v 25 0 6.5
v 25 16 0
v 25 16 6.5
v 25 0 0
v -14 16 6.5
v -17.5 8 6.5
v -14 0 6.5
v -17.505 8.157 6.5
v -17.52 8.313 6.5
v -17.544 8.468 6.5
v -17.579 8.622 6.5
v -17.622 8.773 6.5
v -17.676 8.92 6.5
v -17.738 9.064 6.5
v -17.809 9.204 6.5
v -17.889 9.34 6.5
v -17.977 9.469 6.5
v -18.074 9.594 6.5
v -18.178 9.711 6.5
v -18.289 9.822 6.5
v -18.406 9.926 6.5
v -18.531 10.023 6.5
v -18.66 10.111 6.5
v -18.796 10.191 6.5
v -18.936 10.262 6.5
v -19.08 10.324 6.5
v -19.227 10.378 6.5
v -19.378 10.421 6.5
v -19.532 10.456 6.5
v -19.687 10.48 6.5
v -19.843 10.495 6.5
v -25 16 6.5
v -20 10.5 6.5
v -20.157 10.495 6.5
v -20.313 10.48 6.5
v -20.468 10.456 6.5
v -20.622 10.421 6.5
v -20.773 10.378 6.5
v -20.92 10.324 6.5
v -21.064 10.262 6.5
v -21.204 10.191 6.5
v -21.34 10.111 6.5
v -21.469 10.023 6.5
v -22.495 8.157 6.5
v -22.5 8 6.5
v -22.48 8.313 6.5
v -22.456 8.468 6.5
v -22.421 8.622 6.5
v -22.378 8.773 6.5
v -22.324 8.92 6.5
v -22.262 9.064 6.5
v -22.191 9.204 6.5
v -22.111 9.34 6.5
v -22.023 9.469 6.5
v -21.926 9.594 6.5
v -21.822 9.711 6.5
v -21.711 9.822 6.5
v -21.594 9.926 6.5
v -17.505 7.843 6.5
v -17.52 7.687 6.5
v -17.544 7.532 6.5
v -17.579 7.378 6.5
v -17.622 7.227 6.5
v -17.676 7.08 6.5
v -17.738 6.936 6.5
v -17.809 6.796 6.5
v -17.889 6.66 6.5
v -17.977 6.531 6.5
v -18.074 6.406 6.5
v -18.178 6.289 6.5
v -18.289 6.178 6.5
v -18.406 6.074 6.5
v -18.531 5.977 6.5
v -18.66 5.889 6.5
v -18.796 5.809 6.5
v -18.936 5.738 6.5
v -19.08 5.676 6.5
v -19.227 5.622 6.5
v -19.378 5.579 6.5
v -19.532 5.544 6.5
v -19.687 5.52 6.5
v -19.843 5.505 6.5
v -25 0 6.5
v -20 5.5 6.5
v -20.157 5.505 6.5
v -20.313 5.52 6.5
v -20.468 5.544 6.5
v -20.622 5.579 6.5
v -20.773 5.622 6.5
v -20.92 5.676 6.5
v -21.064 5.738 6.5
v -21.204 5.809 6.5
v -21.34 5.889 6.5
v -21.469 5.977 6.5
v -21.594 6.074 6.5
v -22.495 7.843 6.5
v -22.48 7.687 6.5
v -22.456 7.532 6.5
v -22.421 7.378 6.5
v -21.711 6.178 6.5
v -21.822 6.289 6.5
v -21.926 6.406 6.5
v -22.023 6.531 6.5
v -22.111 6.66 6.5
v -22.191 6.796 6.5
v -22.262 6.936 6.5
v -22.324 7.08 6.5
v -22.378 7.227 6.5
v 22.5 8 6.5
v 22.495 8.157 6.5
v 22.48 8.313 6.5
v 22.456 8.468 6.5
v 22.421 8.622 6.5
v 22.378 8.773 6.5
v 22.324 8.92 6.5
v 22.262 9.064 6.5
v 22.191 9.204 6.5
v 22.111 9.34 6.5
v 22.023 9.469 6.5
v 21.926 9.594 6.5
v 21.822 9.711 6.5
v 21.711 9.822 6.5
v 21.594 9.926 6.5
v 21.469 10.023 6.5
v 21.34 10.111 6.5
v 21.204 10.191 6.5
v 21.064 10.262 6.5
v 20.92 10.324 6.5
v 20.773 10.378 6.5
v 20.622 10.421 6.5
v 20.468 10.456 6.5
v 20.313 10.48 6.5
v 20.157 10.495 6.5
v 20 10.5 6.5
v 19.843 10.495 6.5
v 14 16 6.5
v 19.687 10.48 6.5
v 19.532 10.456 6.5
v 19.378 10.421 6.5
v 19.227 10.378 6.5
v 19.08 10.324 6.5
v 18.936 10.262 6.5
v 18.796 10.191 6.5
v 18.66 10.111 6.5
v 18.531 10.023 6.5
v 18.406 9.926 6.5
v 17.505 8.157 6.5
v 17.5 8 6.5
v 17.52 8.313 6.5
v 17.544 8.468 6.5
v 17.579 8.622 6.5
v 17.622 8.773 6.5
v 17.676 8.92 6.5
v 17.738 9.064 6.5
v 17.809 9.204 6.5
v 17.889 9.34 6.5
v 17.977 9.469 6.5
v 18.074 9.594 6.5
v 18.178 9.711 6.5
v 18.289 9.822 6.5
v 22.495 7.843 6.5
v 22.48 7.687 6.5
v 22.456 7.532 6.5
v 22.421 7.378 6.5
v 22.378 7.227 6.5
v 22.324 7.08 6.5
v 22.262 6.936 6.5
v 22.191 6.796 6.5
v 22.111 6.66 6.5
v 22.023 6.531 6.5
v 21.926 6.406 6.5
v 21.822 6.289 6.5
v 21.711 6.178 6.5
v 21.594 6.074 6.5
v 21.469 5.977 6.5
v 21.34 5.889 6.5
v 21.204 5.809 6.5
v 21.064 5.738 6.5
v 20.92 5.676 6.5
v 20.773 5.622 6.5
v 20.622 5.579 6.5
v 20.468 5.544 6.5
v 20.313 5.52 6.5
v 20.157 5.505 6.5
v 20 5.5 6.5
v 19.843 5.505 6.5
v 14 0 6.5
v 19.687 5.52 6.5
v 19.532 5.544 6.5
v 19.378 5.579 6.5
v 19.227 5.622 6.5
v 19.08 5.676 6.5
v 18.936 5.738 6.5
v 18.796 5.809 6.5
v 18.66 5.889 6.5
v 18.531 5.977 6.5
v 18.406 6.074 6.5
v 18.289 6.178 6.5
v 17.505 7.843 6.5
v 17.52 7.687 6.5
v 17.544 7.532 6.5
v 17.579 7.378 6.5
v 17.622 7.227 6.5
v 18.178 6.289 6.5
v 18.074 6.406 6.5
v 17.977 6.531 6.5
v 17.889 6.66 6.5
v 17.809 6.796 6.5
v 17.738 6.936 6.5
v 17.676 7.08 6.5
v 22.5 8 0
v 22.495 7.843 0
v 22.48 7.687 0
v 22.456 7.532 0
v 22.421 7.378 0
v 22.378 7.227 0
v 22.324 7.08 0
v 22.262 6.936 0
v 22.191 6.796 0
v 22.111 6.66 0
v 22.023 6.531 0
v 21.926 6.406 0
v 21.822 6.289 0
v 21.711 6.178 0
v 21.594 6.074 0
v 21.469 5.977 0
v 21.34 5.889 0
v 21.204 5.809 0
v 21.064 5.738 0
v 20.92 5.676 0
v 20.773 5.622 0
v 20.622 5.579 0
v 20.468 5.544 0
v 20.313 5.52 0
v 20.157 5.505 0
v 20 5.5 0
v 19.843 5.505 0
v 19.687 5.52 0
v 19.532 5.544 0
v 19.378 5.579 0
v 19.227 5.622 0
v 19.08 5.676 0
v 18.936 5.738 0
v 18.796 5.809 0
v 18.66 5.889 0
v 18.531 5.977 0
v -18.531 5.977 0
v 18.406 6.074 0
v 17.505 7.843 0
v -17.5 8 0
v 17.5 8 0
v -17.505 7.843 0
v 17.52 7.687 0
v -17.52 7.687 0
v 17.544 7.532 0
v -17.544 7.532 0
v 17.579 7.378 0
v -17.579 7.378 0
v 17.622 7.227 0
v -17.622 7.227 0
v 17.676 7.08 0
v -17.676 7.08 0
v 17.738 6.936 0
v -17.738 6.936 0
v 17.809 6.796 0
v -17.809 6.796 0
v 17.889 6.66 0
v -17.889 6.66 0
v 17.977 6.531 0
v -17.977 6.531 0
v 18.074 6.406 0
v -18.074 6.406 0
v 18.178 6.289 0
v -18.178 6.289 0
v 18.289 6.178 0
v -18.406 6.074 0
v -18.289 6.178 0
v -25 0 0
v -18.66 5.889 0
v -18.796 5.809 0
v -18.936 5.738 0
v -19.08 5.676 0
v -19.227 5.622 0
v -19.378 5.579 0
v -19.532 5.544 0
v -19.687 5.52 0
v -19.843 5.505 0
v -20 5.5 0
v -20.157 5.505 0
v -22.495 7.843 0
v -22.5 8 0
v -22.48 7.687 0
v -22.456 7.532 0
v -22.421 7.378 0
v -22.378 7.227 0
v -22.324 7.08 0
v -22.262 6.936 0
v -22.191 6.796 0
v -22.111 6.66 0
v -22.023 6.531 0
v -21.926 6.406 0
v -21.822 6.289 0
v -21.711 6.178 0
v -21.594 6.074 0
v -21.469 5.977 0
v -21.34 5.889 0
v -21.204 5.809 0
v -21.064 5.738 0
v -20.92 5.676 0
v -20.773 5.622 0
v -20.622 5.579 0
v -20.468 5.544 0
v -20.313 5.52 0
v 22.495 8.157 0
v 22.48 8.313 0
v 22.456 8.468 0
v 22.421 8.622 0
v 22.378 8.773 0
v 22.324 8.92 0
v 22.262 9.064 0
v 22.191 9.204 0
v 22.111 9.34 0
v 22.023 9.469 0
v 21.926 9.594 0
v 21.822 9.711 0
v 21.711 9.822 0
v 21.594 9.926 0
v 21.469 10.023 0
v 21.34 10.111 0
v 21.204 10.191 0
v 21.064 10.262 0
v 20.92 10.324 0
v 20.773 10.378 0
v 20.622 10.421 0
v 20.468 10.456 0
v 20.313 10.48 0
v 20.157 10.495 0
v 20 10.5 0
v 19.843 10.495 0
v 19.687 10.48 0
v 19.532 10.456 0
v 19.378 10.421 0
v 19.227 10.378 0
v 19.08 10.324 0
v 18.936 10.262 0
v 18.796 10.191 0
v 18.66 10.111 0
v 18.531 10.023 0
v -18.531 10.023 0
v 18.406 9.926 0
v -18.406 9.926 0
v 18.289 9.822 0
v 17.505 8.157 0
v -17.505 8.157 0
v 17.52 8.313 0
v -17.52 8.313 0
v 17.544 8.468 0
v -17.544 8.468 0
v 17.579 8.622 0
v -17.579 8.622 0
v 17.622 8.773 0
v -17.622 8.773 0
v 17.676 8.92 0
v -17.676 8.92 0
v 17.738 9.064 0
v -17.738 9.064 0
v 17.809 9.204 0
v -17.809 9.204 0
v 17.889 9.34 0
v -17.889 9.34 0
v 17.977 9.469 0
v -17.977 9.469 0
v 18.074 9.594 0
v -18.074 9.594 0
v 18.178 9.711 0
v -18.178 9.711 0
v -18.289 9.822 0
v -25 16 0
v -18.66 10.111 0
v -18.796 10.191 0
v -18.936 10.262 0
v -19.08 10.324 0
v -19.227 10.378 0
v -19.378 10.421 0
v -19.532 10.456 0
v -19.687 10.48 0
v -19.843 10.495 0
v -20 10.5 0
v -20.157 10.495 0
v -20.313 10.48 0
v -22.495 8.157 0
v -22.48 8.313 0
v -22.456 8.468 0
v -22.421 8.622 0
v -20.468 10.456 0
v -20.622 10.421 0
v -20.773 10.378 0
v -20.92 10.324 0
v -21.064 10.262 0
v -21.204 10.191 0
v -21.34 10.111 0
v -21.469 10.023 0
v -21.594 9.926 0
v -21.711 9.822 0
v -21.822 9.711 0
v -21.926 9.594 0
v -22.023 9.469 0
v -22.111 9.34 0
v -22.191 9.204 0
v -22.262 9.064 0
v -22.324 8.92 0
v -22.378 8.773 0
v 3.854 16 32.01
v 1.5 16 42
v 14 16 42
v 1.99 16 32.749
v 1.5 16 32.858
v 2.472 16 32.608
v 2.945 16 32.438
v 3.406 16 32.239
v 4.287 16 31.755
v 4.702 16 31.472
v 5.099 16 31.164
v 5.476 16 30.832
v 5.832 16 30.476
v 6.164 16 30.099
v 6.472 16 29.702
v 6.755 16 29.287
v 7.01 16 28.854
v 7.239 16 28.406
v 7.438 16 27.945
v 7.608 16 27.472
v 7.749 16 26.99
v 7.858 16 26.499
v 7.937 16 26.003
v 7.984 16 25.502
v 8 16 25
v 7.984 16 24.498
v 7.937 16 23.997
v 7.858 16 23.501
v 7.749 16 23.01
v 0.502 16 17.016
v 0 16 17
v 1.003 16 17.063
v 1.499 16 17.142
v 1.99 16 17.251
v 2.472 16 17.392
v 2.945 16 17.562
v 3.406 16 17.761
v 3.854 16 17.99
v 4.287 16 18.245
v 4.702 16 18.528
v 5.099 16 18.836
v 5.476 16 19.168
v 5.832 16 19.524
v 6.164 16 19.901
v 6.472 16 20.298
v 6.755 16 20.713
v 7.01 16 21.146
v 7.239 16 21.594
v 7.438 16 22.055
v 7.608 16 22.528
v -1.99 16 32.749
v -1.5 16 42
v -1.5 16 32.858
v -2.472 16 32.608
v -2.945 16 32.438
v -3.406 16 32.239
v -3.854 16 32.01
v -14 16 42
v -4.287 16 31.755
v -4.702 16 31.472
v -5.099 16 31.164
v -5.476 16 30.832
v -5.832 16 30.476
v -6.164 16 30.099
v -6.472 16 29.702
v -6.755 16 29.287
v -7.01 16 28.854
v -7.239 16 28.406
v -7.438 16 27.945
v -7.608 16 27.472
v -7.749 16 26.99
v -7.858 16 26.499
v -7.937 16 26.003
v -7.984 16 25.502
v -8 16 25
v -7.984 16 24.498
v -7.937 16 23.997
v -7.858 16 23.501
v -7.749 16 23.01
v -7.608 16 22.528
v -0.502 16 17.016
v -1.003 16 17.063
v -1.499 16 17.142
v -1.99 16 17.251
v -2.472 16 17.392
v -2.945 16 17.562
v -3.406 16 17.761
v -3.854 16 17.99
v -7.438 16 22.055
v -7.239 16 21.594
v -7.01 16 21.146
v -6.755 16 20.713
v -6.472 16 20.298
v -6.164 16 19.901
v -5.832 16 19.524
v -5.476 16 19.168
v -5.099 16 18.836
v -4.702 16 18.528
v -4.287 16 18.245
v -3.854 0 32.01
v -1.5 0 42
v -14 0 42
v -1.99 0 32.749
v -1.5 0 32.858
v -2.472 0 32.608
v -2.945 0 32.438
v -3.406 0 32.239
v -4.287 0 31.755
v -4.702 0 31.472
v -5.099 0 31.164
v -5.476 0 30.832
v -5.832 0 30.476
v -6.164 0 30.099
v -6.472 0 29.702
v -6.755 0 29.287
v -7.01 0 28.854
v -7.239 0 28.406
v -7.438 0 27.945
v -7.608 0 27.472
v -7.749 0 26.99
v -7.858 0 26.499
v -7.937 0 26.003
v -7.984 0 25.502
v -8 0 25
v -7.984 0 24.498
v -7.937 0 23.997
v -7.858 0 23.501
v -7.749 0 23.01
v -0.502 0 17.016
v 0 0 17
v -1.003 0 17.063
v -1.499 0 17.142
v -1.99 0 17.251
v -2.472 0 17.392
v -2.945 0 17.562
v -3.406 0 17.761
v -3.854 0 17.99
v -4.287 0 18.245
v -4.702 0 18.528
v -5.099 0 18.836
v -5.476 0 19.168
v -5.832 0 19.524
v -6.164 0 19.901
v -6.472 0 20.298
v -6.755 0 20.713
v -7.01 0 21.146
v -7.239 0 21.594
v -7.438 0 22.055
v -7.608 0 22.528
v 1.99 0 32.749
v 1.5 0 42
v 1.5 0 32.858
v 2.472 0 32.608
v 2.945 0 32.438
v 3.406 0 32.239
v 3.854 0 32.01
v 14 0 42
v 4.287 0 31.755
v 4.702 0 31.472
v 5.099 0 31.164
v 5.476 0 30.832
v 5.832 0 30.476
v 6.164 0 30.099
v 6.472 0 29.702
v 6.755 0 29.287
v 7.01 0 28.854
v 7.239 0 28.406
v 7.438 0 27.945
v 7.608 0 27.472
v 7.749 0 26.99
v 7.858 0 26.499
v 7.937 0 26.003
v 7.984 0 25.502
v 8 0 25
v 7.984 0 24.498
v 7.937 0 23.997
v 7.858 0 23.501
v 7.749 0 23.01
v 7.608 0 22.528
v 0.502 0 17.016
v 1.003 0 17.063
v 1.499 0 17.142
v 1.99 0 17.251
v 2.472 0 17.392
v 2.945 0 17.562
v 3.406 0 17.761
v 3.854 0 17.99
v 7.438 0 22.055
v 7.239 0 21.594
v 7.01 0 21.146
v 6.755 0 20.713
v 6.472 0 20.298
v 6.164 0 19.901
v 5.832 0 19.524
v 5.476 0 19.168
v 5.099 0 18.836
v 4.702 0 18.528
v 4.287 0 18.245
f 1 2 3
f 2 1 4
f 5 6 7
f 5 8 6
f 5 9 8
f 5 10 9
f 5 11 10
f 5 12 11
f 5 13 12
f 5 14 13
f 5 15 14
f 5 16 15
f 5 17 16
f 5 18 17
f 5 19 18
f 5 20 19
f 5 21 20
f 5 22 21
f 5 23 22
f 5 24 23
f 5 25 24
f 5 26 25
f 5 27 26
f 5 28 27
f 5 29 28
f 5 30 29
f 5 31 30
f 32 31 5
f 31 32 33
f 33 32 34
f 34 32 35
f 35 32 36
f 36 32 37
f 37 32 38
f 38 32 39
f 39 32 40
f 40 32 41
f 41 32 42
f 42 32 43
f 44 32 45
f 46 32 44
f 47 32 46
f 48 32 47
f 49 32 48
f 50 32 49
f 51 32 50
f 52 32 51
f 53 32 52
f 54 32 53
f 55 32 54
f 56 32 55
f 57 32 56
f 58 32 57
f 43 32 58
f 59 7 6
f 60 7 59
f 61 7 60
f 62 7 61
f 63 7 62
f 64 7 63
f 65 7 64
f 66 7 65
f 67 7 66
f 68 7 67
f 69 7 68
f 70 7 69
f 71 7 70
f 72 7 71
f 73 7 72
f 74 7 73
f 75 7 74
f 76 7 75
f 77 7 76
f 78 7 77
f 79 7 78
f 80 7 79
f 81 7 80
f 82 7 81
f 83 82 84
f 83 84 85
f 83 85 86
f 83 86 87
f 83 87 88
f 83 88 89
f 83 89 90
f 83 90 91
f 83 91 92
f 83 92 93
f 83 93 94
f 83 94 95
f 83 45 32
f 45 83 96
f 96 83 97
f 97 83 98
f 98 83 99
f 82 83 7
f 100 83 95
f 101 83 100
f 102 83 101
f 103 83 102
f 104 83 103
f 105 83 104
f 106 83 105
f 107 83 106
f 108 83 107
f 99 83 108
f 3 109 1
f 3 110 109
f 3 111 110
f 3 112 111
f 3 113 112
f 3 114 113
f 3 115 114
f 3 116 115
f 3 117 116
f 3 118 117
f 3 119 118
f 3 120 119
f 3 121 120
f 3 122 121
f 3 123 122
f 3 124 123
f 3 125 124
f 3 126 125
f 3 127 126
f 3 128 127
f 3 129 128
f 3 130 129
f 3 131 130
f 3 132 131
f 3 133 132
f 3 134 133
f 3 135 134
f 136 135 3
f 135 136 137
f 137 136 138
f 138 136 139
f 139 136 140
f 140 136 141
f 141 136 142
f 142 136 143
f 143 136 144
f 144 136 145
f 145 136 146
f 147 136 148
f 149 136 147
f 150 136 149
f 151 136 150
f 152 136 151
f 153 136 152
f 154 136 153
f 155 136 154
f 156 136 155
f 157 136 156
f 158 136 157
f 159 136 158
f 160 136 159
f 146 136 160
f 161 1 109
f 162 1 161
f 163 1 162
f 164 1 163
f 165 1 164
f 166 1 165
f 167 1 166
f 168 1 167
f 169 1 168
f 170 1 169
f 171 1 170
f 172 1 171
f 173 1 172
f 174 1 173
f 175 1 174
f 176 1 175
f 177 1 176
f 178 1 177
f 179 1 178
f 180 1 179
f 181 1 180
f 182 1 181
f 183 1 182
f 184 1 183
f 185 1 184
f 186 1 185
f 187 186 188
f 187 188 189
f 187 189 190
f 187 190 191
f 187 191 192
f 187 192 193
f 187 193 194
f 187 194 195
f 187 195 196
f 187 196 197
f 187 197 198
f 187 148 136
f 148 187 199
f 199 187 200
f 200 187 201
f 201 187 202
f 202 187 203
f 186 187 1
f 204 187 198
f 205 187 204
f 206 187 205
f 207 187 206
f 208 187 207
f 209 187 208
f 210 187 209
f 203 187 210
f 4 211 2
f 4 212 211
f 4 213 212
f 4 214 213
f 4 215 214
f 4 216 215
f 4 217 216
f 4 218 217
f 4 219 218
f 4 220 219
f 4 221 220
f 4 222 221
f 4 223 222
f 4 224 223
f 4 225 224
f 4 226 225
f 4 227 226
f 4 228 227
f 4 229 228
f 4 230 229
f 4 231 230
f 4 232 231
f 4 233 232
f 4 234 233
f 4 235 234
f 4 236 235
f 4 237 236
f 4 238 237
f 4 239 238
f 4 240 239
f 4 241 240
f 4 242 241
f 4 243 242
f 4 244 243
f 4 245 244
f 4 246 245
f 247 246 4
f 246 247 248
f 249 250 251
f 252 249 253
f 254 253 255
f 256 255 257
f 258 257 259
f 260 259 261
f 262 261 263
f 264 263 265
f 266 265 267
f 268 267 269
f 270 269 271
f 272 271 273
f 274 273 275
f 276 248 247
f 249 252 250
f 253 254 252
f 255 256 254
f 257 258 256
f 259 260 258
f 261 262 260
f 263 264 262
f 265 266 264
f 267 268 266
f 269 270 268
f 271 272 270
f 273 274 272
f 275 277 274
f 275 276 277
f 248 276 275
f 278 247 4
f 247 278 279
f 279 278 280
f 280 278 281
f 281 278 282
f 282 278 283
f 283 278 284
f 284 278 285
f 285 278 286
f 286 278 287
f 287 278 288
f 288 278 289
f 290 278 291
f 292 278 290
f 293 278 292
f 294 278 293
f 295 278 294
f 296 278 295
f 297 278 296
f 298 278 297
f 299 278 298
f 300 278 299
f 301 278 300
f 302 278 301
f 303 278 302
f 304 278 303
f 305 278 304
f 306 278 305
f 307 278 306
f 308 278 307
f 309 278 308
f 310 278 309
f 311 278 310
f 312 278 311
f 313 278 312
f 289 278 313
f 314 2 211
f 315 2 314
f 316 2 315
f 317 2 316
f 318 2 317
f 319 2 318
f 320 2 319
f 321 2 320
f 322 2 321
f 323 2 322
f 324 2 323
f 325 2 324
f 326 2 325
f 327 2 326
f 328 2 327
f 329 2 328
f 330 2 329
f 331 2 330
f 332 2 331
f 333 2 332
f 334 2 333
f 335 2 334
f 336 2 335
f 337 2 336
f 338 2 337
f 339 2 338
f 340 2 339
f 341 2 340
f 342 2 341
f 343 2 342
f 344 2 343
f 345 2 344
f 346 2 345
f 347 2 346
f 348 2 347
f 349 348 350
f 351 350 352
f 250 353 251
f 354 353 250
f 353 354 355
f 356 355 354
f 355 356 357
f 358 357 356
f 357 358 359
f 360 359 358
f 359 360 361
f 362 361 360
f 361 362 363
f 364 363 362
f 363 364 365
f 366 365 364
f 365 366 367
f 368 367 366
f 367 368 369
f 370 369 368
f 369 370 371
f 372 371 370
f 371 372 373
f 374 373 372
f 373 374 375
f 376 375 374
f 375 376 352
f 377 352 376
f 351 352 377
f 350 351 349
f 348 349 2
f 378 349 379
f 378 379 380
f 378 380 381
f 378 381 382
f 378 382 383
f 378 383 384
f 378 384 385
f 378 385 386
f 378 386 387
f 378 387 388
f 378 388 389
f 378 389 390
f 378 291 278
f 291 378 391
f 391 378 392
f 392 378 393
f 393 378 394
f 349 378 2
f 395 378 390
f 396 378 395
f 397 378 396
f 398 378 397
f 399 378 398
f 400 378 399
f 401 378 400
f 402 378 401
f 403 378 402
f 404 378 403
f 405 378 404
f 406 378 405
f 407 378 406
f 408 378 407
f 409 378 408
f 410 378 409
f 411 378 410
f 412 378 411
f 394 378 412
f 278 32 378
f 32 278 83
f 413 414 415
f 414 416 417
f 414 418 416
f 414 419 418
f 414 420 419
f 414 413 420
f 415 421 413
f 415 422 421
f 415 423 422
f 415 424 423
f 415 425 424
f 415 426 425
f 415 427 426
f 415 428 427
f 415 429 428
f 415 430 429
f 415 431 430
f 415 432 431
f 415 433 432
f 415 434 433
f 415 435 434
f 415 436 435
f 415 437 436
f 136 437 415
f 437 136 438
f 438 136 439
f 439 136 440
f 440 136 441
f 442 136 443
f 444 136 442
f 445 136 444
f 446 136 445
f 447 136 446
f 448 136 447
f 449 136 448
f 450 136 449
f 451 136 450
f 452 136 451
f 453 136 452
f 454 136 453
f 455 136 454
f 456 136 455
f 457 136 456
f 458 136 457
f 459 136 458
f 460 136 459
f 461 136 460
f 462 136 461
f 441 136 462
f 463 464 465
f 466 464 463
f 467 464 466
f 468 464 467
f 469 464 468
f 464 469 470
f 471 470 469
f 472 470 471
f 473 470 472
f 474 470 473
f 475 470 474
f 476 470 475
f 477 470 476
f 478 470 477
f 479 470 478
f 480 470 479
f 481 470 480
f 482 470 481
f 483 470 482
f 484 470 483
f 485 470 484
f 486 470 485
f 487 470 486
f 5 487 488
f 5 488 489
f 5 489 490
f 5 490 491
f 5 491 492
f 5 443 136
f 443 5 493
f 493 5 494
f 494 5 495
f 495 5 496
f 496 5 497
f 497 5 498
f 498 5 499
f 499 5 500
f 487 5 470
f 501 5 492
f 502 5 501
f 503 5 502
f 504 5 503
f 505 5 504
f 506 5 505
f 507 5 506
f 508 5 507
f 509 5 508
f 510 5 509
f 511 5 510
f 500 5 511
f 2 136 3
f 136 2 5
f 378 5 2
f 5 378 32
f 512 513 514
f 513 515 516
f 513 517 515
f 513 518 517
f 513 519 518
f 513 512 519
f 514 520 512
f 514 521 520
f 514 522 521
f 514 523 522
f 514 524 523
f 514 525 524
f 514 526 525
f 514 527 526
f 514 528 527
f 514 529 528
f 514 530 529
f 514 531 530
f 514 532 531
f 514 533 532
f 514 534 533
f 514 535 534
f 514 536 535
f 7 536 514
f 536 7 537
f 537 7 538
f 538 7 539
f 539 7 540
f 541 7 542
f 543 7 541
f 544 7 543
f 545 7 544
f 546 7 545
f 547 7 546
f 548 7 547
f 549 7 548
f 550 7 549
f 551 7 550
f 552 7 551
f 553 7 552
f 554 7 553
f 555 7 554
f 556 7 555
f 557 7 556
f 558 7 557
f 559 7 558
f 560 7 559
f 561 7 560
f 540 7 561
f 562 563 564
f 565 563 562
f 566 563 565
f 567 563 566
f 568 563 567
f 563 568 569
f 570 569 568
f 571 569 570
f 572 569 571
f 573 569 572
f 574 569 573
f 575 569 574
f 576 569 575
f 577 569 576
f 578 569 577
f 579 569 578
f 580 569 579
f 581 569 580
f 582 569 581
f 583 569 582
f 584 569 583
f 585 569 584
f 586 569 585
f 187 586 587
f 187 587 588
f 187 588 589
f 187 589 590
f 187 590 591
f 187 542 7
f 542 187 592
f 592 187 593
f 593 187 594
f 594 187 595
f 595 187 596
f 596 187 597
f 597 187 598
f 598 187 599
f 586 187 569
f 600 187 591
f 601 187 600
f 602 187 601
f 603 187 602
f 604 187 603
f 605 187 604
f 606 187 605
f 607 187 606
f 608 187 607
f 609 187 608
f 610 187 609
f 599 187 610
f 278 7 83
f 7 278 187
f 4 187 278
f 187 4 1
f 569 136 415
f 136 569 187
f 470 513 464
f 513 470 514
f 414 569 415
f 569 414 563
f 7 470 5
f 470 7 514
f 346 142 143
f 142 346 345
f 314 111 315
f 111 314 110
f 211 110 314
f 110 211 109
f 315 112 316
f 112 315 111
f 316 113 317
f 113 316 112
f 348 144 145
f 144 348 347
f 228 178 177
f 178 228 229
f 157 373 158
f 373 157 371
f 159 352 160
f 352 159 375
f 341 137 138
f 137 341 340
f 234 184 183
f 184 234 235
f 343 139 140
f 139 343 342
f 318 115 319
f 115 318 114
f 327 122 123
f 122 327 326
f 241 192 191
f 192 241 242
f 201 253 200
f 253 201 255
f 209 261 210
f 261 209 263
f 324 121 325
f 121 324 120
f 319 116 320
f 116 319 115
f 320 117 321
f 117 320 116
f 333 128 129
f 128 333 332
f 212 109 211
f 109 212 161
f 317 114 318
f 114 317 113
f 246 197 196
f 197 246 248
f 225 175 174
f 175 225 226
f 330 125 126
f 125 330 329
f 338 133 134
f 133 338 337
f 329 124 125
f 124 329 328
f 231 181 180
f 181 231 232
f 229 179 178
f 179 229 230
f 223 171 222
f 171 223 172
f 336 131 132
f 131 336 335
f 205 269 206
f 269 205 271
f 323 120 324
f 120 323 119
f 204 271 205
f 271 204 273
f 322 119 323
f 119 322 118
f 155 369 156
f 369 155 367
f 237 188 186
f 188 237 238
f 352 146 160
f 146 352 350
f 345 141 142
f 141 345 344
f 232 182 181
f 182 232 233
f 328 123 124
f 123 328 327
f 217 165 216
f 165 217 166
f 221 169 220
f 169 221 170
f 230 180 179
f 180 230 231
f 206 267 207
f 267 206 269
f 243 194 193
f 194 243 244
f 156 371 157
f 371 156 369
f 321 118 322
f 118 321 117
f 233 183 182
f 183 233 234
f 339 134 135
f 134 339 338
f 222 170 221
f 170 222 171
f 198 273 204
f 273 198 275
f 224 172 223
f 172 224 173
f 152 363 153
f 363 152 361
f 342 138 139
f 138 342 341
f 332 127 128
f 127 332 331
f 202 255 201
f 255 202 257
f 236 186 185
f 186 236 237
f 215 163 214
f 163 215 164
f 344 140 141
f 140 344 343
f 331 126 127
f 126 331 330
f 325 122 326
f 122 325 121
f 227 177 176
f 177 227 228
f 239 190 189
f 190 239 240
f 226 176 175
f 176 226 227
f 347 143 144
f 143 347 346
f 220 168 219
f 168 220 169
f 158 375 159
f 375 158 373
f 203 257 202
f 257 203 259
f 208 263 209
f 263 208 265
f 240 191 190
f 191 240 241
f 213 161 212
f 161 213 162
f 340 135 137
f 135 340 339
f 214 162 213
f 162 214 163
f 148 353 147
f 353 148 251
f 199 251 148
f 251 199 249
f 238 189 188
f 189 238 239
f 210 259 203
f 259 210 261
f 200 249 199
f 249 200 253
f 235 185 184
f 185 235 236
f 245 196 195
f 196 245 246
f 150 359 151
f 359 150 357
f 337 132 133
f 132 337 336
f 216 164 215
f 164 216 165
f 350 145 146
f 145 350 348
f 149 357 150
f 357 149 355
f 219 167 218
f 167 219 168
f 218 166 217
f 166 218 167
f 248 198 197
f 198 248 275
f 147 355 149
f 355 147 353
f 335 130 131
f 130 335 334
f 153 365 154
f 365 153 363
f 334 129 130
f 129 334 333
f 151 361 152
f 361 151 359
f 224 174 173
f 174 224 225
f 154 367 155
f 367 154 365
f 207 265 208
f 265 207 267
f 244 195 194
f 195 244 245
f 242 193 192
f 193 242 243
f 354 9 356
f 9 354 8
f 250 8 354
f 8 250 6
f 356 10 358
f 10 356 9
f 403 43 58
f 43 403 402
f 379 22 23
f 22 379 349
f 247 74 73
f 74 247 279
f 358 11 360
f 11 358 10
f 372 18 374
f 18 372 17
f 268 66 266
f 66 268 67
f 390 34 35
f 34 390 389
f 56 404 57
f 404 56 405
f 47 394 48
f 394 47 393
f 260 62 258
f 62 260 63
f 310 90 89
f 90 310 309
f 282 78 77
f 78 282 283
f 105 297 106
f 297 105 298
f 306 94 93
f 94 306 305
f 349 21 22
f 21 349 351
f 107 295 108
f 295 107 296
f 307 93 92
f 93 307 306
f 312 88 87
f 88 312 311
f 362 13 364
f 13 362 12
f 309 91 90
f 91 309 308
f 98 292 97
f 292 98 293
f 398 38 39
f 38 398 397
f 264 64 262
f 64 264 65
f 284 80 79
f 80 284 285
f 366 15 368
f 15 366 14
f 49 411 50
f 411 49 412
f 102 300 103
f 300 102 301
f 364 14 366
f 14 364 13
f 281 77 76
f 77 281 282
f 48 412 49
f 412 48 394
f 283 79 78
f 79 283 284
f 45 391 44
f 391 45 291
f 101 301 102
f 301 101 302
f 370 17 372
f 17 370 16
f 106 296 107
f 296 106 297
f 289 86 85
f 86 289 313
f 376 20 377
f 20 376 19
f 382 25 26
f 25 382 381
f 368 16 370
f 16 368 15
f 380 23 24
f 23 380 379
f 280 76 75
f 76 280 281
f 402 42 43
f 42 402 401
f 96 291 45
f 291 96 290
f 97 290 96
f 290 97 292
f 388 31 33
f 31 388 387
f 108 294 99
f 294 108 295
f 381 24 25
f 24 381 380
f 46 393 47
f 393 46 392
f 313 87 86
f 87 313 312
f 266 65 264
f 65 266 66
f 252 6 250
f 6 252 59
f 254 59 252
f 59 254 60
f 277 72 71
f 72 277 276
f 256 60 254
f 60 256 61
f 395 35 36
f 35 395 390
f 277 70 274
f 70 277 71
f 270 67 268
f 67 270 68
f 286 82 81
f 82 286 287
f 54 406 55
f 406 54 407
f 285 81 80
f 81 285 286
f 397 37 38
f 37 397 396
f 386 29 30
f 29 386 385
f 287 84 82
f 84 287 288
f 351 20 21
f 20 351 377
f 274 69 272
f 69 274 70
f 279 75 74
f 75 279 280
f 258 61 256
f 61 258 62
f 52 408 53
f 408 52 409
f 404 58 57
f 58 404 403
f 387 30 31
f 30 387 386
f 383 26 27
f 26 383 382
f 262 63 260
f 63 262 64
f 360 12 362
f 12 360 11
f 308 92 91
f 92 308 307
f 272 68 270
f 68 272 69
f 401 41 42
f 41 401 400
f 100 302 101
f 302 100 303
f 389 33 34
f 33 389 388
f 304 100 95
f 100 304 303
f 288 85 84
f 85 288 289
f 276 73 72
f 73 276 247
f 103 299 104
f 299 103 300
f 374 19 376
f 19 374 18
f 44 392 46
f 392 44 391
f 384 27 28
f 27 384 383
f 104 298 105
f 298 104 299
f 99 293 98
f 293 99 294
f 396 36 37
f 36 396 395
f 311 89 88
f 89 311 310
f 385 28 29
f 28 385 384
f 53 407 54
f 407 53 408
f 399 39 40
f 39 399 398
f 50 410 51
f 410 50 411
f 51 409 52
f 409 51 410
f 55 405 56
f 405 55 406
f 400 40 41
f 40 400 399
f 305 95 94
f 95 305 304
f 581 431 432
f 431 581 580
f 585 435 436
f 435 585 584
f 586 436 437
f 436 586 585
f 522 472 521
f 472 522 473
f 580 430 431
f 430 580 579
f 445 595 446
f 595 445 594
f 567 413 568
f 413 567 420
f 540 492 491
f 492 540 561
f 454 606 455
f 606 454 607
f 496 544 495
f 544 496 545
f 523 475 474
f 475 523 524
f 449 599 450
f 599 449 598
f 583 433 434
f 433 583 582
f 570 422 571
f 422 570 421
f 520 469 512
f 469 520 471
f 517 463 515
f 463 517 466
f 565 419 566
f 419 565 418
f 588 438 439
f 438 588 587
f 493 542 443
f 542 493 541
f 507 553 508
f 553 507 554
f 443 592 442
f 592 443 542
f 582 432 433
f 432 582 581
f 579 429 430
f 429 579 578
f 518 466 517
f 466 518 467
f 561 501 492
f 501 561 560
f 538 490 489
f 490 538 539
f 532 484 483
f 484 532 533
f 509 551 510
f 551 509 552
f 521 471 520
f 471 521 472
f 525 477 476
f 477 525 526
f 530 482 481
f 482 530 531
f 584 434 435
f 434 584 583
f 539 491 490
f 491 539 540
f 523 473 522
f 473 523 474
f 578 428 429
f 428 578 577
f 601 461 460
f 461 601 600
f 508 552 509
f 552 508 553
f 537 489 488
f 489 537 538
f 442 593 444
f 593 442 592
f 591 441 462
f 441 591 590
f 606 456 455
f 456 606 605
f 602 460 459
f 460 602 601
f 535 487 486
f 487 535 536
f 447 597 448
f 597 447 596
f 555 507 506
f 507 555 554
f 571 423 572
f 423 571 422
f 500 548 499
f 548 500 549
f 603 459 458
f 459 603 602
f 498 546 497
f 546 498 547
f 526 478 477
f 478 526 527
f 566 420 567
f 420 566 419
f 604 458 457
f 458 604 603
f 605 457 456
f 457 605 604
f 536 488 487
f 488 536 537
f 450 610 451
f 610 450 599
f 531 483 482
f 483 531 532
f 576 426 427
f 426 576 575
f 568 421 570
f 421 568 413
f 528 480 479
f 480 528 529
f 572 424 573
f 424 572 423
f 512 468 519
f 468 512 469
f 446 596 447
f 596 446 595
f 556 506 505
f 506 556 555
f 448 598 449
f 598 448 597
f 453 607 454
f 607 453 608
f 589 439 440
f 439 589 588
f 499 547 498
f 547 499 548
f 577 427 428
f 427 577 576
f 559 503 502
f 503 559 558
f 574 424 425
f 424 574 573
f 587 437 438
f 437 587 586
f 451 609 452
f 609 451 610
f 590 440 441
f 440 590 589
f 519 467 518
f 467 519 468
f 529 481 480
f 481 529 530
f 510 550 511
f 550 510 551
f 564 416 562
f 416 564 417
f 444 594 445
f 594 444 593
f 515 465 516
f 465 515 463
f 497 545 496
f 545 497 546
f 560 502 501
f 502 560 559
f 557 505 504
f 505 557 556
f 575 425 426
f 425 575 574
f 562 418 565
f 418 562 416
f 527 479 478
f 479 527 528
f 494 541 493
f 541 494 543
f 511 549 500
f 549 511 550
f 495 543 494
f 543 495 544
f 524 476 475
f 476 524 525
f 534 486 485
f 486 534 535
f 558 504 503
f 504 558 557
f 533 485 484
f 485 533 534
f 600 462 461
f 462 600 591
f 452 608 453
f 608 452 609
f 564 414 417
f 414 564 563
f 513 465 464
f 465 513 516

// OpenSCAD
/*
OPENSCAD Project - EquinoxeFR 2011
License Creative Commons

Object: Support
*/
difference()
{
	
	difference()
	{
	union()
	{
		translate([-25,0,0])
		{
			cube(size = [50,16,6.5]);		
		}
		translate([-14,0,0])
		{
			cube(size = [28,16,42]);
		}
	}
	// Hole for rail
	rotate([90,0,0])
	{
		translate([0,25,-50])
		{
			cylinder(r=8,h=100,$fn=100);
		}
	}
	// Support hole
	rotate([0,0,0])	
	{
		translate([20,8,0])
		{
			cylinder(r=2.5,h=100,$fn=100);
		}
		translate([-20,8,0])
		{
			cylinder(r=2.5,h=100,$fn=100);
		}

	}

	}
translate([-1.5,-3,28])
	cube(size = [3,22,15]);	
}
